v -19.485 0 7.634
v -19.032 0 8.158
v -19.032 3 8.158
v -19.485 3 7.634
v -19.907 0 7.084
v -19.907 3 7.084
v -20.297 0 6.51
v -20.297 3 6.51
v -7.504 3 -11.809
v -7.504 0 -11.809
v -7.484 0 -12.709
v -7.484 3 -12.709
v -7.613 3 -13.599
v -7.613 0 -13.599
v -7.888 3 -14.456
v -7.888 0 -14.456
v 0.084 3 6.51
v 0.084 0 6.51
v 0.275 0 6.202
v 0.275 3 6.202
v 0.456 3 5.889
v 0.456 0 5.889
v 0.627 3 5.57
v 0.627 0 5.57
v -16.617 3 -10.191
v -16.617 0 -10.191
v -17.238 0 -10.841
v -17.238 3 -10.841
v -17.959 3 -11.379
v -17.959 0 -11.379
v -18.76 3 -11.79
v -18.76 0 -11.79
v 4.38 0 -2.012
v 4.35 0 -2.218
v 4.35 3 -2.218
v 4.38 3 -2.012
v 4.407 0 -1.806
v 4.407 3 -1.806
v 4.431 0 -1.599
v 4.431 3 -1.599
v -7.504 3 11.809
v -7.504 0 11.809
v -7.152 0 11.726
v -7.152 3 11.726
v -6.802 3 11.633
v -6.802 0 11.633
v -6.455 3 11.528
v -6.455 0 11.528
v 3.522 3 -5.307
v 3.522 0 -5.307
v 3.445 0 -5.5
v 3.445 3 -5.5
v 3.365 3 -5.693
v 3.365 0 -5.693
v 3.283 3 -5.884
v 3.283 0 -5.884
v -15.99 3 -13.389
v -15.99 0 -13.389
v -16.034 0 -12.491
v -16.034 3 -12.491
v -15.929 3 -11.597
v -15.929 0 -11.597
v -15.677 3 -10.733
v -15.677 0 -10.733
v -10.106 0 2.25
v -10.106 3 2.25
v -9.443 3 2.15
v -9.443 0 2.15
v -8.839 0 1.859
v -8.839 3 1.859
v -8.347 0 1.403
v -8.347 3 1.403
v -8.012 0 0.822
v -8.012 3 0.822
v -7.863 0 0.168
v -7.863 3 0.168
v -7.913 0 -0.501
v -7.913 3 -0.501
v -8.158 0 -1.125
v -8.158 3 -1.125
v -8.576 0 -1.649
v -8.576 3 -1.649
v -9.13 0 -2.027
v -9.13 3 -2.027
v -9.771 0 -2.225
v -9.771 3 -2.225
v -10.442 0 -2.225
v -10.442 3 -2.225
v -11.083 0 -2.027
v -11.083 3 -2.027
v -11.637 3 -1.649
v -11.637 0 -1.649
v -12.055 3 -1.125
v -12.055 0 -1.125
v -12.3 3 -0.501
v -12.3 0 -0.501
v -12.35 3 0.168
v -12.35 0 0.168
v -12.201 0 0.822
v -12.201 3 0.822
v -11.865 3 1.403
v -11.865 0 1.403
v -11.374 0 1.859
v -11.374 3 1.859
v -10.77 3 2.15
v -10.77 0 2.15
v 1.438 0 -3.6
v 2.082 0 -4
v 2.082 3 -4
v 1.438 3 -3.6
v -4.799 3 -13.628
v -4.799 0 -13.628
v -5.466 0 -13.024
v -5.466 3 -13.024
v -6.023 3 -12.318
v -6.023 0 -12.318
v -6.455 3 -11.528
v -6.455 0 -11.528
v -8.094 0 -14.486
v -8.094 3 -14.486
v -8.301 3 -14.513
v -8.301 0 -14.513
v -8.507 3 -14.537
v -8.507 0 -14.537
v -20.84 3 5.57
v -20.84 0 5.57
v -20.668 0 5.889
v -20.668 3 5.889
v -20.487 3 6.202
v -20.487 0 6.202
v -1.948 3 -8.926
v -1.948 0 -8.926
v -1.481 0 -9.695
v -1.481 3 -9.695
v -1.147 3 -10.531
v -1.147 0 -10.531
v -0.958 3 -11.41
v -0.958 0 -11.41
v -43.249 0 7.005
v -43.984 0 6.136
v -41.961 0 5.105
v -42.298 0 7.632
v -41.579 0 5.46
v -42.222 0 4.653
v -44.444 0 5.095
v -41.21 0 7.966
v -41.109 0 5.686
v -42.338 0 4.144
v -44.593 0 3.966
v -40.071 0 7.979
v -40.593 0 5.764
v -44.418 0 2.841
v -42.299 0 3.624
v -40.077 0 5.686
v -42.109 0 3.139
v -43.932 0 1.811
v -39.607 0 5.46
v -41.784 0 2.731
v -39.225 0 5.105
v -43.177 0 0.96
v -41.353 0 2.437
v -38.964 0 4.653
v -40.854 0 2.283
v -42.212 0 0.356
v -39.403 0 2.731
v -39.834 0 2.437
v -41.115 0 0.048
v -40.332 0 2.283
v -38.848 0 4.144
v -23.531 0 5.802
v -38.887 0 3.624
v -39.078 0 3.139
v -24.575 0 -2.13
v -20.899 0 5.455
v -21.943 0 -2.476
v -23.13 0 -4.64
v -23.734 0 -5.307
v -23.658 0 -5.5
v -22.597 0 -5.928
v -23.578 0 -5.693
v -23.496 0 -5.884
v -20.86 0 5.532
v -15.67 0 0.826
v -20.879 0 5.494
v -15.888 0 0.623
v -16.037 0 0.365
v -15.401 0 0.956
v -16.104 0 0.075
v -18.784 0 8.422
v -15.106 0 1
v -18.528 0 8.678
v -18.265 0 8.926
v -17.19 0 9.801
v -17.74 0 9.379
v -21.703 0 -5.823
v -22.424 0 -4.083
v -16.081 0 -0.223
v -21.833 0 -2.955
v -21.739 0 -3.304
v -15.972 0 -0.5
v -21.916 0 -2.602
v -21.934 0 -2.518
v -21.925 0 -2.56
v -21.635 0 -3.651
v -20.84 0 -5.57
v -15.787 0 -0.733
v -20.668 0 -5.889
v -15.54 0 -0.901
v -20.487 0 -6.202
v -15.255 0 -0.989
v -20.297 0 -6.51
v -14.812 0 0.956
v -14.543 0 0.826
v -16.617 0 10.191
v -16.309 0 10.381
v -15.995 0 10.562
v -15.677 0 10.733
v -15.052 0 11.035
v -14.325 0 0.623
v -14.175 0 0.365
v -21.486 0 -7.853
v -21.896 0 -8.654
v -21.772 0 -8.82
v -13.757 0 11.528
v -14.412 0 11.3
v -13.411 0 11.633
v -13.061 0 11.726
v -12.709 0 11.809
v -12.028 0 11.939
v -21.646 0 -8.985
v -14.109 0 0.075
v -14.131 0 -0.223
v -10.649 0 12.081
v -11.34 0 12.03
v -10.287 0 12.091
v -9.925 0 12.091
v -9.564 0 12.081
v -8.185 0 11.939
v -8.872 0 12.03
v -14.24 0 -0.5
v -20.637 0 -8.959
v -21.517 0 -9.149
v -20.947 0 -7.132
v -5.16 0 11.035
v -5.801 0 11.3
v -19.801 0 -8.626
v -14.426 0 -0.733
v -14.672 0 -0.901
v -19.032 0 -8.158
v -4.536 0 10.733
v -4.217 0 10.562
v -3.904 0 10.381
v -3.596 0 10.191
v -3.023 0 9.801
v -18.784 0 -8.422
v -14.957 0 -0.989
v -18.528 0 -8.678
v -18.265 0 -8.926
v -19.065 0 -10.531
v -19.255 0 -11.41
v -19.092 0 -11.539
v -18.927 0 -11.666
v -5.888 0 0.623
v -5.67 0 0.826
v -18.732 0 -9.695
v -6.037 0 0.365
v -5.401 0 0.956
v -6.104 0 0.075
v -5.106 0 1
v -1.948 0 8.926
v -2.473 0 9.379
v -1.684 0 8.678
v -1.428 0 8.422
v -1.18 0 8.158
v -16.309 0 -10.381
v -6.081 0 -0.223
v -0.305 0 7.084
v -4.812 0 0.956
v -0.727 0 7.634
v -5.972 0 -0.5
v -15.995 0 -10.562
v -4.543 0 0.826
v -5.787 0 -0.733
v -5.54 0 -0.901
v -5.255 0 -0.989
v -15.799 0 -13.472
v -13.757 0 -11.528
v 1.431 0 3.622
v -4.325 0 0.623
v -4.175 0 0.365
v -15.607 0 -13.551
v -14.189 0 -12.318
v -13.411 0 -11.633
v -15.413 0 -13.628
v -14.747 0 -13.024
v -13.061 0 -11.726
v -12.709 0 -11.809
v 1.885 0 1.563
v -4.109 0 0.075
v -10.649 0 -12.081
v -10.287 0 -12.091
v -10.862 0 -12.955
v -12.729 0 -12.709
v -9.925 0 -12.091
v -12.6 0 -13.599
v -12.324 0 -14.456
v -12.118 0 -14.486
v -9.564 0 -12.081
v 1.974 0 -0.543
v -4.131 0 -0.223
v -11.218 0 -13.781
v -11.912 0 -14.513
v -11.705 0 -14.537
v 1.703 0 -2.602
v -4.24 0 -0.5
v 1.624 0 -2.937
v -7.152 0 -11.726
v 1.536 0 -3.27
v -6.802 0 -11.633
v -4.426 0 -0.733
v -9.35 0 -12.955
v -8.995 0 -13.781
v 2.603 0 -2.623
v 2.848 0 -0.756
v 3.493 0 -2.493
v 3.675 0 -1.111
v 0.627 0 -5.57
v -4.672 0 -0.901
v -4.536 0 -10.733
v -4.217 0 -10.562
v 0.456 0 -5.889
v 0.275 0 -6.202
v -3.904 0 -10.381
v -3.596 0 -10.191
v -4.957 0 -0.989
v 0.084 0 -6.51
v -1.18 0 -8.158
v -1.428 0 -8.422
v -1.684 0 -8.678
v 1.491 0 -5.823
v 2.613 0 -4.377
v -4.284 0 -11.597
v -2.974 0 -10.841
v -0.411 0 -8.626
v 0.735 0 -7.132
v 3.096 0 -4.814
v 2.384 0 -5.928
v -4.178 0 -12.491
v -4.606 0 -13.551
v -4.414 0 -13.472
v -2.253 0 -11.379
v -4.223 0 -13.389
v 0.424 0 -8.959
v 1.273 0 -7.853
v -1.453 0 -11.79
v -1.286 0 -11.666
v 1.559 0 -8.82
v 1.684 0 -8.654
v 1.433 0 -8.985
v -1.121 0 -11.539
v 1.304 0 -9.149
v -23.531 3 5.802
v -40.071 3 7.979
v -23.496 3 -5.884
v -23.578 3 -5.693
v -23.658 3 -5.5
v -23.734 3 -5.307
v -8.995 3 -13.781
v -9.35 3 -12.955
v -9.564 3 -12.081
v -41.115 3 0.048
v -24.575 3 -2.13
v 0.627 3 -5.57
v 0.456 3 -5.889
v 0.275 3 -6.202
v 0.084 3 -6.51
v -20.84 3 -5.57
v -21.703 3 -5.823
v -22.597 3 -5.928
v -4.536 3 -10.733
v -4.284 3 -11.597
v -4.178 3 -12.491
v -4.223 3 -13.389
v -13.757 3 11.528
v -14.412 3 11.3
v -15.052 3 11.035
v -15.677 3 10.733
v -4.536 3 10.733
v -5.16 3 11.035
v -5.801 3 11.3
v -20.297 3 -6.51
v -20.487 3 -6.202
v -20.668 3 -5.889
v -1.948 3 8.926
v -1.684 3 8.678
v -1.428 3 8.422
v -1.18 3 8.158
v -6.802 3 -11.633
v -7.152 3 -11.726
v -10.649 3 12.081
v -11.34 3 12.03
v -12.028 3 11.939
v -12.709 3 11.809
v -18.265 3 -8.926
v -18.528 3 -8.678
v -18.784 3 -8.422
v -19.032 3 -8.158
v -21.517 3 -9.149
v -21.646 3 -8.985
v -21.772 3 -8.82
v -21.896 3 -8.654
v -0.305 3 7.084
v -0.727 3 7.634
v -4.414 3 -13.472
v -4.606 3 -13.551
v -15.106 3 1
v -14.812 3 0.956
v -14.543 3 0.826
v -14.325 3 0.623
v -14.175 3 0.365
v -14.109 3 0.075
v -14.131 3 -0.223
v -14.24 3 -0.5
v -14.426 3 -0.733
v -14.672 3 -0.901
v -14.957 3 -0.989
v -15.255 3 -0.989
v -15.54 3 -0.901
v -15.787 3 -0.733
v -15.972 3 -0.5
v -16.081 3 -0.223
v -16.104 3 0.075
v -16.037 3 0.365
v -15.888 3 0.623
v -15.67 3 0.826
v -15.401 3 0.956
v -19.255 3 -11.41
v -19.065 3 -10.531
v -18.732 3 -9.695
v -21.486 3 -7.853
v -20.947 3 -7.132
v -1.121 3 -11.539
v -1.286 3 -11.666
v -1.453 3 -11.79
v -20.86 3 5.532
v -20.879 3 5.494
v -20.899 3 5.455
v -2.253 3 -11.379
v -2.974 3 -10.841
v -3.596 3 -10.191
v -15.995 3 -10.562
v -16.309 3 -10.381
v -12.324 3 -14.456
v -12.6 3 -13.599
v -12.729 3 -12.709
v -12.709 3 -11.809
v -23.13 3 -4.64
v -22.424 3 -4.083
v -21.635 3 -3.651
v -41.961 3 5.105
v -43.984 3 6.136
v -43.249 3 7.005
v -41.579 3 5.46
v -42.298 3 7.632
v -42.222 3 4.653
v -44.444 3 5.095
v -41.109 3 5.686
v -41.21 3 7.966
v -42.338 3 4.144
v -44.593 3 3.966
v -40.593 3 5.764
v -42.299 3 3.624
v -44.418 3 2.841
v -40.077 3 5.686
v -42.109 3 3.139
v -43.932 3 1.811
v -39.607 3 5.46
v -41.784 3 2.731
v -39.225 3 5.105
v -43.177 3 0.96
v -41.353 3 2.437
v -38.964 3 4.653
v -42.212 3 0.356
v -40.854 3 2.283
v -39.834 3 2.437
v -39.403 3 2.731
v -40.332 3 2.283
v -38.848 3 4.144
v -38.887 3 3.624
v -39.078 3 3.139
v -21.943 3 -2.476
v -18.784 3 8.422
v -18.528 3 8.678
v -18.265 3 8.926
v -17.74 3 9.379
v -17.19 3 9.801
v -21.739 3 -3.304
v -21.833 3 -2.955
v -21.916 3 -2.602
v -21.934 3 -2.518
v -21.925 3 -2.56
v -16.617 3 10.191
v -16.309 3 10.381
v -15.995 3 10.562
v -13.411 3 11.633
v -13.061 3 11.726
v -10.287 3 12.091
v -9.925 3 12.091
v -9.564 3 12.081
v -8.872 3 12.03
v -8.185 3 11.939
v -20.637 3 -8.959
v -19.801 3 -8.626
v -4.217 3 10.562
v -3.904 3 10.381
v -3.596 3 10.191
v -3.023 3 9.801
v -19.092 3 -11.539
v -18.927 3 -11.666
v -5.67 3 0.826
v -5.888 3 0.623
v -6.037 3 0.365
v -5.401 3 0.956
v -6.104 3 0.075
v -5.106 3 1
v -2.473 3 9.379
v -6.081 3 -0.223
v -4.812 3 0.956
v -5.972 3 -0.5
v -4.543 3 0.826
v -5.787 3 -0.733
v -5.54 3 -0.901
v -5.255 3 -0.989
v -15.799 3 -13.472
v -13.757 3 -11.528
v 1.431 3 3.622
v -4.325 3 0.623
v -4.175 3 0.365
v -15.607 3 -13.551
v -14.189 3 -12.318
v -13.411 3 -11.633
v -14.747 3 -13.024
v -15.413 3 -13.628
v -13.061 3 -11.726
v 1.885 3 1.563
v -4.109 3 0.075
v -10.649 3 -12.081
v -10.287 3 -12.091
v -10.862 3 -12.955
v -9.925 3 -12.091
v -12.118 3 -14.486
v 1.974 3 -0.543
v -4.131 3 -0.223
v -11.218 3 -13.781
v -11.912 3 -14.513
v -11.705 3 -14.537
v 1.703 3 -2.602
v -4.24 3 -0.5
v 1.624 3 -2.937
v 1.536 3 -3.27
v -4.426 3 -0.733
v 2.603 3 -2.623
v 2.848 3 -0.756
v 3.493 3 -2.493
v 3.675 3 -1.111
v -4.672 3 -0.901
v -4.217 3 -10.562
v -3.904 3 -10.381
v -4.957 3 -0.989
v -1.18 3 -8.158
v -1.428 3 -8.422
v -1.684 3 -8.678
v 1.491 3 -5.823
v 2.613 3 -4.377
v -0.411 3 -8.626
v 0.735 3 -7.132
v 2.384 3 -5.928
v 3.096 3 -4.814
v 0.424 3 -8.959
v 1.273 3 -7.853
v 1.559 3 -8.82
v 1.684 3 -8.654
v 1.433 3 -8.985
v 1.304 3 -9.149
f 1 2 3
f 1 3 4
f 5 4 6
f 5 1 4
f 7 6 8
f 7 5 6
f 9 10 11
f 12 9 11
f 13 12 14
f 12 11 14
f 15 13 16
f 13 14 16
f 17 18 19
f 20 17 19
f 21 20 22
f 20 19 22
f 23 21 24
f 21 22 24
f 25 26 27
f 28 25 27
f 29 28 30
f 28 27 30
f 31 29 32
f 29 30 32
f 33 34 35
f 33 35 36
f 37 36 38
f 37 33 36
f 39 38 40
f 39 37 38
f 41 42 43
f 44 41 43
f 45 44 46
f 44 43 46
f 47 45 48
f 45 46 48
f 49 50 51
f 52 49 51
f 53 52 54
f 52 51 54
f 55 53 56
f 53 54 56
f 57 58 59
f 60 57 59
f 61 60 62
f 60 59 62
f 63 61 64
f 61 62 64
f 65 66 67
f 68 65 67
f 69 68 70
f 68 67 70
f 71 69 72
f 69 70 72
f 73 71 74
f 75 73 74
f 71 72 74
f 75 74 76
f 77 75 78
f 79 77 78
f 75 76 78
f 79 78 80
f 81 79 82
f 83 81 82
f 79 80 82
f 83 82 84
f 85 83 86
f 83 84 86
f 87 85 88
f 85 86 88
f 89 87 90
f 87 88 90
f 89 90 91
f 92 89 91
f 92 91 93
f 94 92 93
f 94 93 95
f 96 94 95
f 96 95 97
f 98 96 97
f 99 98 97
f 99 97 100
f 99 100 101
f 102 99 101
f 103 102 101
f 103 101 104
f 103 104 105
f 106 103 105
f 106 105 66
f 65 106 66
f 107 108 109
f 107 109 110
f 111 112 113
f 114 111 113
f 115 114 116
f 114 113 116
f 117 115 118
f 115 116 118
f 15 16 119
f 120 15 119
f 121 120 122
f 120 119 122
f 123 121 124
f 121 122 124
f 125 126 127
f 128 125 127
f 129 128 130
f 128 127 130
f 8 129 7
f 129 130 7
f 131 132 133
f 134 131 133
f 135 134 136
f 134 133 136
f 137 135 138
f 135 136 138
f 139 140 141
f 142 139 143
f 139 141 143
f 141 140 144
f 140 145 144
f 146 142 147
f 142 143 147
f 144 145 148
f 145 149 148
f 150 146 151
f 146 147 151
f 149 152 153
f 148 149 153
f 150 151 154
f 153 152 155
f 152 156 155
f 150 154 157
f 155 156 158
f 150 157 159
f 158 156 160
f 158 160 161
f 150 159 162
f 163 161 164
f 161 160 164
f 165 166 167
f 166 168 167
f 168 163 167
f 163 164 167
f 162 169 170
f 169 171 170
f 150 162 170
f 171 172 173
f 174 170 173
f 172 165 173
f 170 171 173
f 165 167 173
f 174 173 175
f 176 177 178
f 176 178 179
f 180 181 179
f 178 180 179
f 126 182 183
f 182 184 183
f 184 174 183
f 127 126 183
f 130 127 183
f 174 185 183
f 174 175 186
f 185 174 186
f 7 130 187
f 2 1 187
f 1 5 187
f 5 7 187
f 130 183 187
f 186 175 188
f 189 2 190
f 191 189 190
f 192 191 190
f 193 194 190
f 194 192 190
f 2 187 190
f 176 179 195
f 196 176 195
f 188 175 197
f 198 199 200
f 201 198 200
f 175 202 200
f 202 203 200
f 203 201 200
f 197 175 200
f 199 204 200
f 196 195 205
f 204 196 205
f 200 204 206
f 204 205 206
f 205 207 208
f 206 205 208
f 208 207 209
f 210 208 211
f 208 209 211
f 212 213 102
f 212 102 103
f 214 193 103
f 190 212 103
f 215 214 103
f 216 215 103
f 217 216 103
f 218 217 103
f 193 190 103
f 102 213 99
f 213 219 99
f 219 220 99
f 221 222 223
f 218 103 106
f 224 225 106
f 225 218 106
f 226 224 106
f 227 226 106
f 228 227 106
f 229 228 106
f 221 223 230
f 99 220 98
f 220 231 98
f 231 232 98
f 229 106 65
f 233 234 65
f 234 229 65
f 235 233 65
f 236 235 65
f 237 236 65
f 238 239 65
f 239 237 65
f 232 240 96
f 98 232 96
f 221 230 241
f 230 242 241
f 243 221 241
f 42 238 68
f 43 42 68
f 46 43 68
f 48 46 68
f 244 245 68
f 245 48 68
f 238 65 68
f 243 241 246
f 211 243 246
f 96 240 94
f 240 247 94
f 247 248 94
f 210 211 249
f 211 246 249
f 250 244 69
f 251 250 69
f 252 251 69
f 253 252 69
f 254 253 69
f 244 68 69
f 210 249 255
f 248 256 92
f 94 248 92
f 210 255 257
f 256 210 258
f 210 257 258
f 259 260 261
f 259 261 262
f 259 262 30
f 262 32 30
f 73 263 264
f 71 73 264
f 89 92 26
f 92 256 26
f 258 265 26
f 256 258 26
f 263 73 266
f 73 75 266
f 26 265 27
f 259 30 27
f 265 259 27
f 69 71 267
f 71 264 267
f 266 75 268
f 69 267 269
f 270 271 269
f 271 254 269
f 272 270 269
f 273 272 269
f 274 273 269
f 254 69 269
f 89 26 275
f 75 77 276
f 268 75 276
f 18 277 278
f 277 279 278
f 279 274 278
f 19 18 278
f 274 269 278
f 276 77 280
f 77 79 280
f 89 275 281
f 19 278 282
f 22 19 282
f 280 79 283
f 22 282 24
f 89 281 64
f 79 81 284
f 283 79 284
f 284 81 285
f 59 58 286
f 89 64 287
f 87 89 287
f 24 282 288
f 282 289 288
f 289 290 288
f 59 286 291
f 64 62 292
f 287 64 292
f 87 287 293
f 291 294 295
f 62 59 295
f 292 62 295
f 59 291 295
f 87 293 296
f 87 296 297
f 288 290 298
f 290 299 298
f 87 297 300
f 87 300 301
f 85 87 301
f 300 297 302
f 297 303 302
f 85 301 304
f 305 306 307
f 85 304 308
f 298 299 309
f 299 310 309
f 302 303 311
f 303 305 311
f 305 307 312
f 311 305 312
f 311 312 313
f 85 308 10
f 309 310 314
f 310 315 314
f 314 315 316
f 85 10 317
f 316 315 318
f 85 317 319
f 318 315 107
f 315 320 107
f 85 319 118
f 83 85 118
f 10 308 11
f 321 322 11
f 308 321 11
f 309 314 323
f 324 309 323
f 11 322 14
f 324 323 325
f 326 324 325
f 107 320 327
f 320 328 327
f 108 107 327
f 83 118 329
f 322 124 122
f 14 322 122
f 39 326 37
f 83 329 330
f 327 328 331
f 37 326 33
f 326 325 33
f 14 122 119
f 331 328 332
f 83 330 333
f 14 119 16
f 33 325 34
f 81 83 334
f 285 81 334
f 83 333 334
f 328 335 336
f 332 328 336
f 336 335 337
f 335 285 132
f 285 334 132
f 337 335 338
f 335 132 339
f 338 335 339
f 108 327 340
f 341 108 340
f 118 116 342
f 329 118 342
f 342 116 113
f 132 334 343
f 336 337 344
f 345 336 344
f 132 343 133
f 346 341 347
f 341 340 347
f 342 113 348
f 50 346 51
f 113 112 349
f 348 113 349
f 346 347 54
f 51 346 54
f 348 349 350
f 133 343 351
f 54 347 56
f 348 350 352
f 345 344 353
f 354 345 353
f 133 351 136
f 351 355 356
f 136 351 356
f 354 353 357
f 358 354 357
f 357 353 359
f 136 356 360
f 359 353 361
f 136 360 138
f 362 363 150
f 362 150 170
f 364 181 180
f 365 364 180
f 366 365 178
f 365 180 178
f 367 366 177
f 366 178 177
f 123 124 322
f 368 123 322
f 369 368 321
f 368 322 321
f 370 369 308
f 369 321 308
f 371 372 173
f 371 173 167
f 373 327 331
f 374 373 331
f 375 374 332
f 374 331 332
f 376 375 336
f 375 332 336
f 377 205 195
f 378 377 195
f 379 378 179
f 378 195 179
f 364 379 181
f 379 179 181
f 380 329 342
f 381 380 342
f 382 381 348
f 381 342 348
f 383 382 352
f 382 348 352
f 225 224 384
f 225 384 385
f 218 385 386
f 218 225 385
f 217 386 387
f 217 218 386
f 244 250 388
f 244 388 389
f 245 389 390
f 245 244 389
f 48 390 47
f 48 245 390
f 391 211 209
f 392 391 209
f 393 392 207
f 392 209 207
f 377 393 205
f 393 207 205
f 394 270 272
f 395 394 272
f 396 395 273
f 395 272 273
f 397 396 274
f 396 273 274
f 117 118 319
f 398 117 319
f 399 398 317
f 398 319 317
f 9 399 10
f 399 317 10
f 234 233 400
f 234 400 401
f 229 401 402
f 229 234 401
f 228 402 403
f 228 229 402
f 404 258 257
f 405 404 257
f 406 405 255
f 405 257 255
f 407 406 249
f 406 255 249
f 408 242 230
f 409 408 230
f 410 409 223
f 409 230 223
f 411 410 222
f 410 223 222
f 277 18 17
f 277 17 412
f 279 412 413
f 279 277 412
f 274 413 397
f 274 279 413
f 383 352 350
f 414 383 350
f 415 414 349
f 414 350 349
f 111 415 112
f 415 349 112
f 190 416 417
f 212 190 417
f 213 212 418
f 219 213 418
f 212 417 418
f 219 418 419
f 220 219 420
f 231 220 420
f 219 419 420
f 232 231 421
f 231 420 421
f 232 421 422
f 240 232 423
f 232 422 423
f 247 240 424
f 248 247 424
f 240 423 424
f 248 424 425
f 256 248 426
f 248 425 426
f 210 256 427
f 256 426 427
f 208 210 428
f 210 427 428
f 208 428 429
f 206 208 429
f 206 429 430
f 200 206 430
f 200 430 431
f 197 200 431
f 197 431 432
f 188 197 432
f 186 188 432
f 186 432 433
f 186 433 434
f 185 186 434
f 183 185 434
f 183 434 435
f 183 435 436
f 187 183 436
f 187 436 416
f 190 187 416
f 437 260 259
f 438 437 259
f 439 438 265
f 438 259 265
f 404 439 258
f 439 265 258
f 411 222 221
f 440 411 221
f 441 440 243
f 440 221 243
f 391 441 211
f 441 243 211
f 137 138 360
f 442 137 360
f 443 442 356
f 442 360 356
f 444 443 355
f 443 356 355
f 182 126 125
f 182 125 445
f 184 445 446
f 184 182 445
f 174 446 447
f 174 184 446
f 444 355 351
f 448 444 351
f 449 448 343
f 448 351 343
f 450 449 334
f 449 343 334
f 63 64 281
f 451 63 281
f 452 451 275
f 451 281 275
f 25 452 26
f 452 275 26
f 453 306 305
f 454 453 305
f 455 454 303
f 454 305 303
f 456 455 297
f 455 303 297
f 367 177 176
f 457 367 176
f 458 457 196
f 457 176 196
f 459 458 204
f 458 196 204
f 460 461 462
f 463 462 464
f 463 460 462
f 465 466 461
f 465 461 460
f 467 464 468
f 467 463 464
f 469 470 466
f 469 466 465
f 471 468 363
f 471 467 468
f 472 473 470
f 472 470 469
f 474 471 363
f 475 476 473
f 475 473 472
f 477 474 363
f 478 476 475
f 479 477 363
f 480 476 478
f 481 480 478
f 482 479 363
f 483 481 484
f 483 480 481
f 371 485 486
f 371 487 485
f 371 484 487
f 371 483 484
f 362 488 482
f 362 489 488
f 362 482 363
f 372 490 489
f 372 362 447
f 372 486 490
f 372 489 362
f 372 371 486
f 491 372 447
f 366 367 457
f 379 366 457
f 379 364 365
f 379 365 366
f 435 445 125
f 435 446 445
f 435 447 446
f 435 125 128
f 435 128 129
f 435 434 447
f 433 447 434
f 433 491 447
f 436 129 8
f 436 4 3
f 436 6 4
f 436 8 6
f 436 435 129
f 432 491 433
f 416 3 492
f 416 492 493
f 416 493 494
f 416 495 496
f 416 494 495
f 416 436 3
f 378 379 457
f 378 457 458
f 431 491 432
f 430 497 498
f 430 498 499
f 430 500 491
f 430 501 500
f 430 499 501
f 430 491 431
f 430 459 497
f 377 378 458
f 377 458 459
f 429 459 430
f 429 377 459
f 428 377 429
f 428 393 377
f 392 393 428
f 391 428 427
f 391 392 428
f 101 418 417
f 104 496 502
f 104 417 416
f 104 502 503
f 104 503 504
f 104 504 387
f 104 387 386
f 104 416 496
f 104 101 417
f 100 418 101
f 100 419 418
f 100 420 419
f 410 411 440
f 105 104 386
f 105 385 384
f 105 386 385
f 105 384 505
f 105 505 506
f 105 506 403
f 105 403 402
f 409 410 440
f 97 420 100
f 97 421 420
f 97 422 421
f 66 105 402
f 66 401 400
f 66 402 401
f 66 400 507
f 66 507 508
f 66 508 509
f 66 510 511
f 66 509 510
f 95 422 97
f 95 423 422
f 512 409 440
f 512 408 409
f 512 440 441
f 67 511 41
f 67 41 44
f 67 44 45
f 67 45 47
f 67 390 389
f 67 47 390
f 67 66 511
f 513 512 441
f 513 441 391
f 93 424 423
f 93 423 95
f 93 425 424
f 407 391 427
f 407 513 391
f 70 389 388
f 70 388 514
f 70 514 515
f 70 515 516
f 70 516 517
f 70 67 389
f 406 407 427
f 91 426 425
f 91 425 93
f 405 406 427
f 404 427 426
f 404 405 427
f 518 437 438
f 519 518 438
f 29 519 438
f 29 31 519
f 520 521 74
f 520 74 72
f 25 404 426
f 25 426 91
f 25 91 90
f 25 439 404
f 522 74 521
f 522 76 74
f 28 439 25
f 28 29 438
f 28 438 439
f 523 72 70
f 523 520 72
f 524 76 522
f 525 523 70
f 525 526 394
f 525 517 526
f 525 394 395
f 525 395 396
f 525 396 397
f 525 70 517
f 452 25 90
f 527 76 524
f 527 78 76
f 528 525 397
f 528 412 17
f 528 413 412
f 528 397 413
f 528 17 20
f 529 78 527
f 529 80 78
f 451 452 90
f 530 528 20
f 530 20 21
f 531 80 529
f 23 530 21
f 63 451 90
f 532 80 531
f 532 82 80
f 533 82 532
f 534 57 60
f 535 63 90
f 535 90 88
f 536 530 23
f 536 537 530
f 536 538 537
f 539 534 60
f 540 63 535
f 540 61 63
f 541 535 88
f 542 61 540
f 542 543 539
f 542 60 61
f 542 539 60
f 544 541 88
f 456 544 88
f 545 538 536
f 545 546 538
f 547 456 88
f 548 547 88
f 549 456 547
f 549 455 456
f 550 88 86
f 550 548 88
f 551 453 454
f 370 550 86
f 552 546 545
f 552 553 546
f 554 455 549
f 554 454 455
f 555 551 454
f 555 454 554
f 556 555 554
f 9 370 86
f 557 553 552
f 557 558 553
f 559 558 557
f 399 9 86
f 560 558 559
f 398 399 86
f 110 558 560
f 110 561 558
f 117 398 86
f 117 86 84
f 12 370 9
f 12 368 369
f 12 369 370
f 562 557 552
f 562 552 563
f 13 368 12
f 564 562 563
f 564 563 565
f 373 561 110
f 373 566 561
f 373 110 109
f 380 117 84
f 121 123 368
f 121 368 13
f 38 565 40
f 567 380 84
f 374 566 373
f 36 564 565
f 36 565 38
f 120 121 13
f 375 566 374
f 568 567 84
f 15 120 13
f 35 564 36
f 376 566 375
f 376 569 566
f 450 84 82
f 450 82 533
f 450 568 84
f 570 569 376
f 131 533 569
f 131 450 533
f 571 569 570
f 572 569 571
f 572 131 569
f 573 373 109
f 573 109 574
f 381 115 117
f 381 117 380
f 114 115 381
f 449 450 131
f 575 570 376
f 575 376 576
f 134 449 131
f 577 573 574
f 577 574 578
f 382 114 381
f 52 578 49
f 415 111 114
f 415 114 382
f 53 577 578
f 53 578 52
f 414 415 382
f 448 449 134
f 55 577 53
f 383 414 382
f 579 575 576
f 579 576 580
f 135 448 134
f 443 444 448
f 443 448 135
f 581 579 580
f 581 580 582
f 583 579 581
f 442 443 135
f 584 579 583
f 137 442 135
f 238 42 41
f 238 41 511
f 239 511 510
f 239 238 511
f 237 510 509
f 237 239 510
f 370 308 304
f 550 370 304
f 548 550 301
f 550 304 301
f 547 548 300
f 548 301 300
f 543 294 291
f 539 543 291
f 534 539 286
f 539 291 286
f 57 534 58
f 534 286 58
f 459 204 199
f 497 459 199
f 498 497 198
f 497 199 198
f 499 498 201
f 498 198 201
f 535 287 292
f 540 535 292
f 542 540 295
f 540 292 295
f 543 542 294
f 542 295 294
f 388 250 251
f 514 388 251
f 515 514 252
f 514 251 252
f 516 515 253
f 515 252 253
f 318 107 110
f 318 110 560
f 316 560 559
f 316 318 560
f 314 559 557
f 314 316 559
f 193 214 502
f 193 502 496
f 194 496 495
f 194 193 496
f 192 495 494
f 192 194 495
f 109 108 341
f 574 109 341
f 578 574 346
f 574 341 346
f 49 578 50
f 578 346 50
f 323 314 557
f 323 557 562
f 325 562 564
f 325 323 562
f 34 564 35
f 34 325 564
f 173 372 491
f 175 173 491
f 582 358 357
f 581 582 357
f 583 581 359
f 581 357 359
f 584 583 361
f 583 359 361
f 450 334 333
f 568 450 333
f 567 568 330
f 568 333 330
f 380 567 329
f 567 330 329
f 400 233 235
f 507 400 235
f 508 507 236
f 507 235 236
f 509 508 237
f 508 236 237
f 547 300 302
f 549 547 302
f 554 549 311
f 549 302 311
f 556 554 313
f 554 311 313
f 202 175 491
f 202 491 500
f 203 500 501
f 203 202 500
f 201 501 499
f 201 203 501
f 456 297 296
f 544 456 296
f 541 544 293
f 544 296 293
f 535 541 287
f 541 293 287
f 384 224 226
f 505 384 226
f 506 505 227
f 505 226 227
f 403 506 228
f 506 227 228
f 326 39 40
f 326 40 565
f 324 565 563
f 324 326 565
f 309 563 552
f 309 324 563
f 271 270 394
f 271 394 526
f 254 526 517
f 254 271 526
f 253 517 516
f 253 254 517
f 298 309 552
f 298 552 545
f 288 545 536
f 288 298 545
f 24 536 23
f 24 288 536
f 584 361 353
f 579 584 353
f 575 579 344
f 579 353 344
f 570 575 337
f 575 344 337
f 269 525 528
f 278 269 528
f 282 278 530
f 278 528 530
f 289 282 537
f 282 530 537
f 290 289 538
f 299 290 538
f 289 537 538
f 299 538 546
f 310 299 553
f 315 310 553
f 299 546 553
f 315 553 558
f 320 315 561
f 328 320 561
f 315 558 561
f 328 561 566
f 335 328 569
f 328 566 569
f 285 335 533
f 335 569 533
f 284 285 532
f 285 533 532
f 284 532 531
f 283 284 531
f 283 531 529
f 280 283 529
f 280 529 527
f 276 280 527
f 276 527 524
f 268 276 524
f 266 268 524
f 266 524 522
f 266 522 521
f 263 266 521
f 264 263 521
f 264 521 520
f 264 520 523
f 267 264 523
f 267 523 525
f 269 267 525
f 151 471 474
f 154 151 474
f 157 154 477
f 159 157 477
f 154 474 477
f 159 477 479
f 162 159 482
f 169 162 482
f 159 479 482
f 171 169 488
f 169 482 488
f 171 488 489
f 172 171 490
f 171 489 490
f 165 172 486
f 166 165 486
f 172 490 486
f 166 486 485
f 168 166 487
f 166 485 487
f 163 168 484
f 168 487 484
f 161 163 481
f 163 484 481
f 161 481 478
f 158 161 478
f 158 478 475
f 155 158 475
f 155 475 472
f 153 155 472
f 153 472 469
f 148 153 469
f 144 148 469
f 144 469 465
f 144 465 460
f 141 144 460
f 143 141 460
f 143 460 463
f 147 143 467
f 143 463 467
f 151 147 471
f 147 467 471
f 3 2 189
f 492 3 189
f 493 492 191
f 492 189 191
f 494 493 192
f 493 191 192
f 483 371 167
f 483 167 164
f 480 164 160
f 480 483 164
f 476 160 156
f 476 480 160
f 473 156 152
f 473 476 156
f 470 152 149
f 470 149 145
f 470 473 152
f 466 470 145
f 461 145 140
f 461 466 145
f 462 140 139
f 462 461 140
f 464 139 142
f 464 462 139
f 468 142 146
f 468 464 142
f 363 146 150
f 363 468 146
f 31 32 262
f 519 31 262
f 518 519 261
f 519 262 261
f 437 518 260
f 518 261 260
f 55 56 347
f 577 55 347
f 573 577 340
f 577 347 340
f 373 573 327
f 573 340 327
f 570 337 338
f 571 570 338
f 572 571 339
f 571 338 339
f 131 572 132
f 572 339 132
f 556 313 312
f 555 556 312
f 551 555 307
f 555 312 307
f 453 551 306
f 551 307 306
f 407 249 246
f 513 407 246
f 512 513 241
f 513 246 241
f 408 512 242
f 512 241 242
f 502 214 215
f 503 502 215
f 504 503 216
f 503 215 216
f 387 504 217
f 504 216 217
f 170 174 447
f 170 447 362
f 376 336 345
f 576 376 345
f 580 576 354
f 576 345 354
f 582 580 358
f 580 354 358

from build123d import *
from build123d.topology import SkipClean

# Parameters (mm, degrees)
SKETCH1_R           = 1.5
BOSS_EXTRUDE1_DEPTH = 3
SKETCH3_R           = 1.75
BOSS_EXTRUDE2_DEPTH = 3
CUT_EXTRUDE1_START  = -4
CUT_EXTRUDE1_DEPTH  = 4
CUT_EXTRUDE2_REACH  = 48.999
SKETCH5_R           = 1
SKETCH5_R_2         = 2.25


with BuildPart() as part:
    # Sketch1 → Boss-Extrude1 (new body)
    with BuildSketch(Plane(origin=(0, 0, 0), x_dir=(1, 0, 0), z_dir=(0, 1, 0))):
        with BuildLine():
            Line((20.643657446, 4), (2.081641936, 4))
            ThreePointArc((2.081641936, 4), (2.861028333, 4.588201733), (3.521749436, 5.30713988))
            ThreePointArc((3.521749436, 5.30713988), (3.405395609, 5.596745198), (3.282888305, 5.883801663))
            ThreePointArc((3.282888305, 5.883801663), (1.93527598, 5.894040025), (0.627094961, 5.57027124))
            ThreePointArc((0.627094961, 5.57027124), (0.366286148, 6.046375), (0.084372603, 6.510293938))
            ThreePointArc((0.084372603, 6.510293938), (1.018855105, 7.48132754), (1.683794586, 8.65351323))
            ThreePointArc((1.683794586, 8.65351323), (1.496450048, 8.903135899), (1.303821399, 9.148703928))
            ThreePointArc((1.303821399, 9.148703928), (-0.000522033, 8.809805691), (-1.180330337, 8.158486898))
            ThreePointArc((-1.180330337, 8.158486898), (-1.555477026, 8.550865528), (-1.947855656, 8.926012217))
            ThreePointArc((-1.947855656, 8.926012217), (-1.296536862, 10.105820521), (-0.957638625, 11.410163953))
            ThreePointArc((-0.957638625, 11.410163953), (-1.203206655, 11.602792602), (-1.452829324, 11.79013714))
            ThreePointArc((-1.452829324, 11.79013714), (-2.625015014, 11.125197659), (-3.596048616, 10.190715157))
            ThreePointArc((-3.596048616, 10.190715157), (-4.059967554, 10.472628702), (-4.536071314, 10.733437515))
            ThreePointArc((-4.536071314, 10.733437515), (-4.212302529, 12.041618533), (-4.222540891, 13.389230859))
            ThreePointArc((-4.222540891, 13.389230859), (-4.509597355, 13.511738163), (-4.799202674, 13.62809199))
            ThreePointArc((-4.799202674, 13.62809199), (-5.759348103, 12.682425791), (-6.455432668, 11.528463019))
            ThreePointArc((-6.455432668, 11.528463019), (-6.976508546, 11.680699536), (-7.503891752, 11.809396783))
            ThreePointArc((-7.503891752, 11.809396783), (-7.529737283, 13.156800143), (-7.888414517, 14.455843809))
            ThreePointArc((-7.888414517, 14.455843809), (-8.197396993, 14.499881098), (-8.507248835, 14.537314892))
            ThreePointArc((-8.507248835, 14.537314892), (-9.18992168, 13.375367565), (-9.563620196, 12.080565177))
            ThreePointArc((-9.563620196, 12.080565177), (-10.106342554, 12.09275), (-10.649064912, 12.080565177))
            ThreePointArc((-10.649064912, 12.080565177), (-11.022763428, 13.375367565), (-11.705436272, 14.537314892))
            ThreePointArc((-11.705436272, 14.537314892), (-12.015288115, 14.499881098), (-12.324270591, 14.455843809))
            ThreePointArc((-12.324270591, 14.455843809), (-12.682947825, 13.156800143), (-12.708793355, 11.809396783))
            ThreePointArc((-12.708793355, 11.809396783), (-13.236176561, 11.680699536), (-13.757252439, 11.528463019))
            ThreePointArc((-13.757252439, 11.528463019), (-14.453337005, 12.682425791), (-15.413482434, 13.62809199))
            ThreePointArc((-15.413482434, 13.62809199), (-15.703087752, 13.511738163), (-15.990144217, 13.389230859))
            ThreePointArc((-15.990144217, 13.389230859), (-16.000382579, 12.041618533), (-15.676613793, 10.733437515))
            ThreePointArc((-15.676613793, 10.733437515), (-16.152717554, 10.472628702), (-16.616636492, 10.190715157))
            ThreePointArc((-16.616636492, 10.190715157), (-17.587670094, 11.125197659), (-18.759855783, 11.79013714))
            ThreePointArc((-18.759855783, 11.79013714), (-19.009478453, 11.602792602), (-19.255046482, 11.410163953))
            ThreePointArc((-19.255046482, 11.410163953), (-18.916148245, 10.105820521), (-18.264829452, 8.926012217))
            ThreePointArc((-18.264829452, 8.926012217), (-18.657208082, 8.550865528), (-19.032354771, 8.158486898))
            ThreePointArc((-19.032354771, 8.158486898), (-20.212163074, 8.809805691), (-21.516506507, 9.148703928))
            ThreePointArc((-21.516506507, 9.148703928), (-21.709135156, 8.903135899), (-21.896479694, 8.65351323))
            ThreePointArc((-21.896479694, 8.65351323), (-21.231540213, 7.48132754), (-20.297057711, 6.510293938))
            ThreePointArc((-20.297057711, 6.510293938), (-20.578971255, 6.046375), (-20.839780068, 5.57027124))
            ThreePointArc((-20.839780068, 5.57027124), (-22.147961087, 5.894040025), (-23.495573413, 5.883801663))
            ThreePointArc((-23.495573413, 5.883801663), (-23.618080717, 5.596745198), (-23.734434544, 5.30713988))
            ThreePointArc((-23.734434544, 5.30713988), (-22.788768345, 4.346994451), (-21.634805572, 3.650909885))
            ThreePointArc((-21.634805572, 3.650909885), (-21.78704209, 3.129834008), (-21.915739337, 2.602450802))
            ThreePointArc((-21.915739337, 2.602450802), (-23.263142697, 2.576605271), (-24.562186363, 2.217928037))
            ThreePointArc((-24.562186363, 2.217928037), (-24.606223651, 1.908945561), (-24.643657446, 1.599093719))
            ThreePointArc((-24.643657446, 1.599093719), (-23.481710119, 0.916420874), (-22.186907731, 0.542722358))
            ThreePointArc((-22.186907731, 0.542722358), (-22.199092554, 0), (-22.186907731, -0.542722358))
            ThreePointArc((-22.186907731, -0.542722358), (-23.481710119, -0.916420874), (-24.643657446, -1.599093719))
            ThreePointArc((-24.643657446, -1.599093719), (-24.606223651, -1.908945561), (-24.562186363, -2.217928037))
            ThreePointArc((-24.562186363, -2.217928037), (-23.263142697, -2.576605271), (-21.915739337, -2.602450802))
            ThreePointArc((-21.915739337, -2.602450802), (-21.78704209, -3.129834008), (-21.634805572, -3.650909885))
            ThreePointArc((-21.634805572, -3.650909885), (-22.788768345, -4.346994451), (-23.734434544, -5.30713988))
            ThreePointArc((-23.734434544, -5.30713988), (-23.618080717, -5.596745198), (-23.495573413, -5.883801663))
            ThreePointArc((-23.495573413, -5.883801663), (-22.147961087, -5.894040025), (-20.839780068, -5.57027124))
            ThreePointArc((-20.839780068, -5.57027124), (-20.578971255, -6.046375), (-20.297057711, -6.510293938))
            ThreePointArc((-20.297057711, -6.510293938), (-21.231540213, -7.48132754), (-21.896479694, -8.65351323))
            ThreePointArc((-21.896479694, -8.65351323), (-21.709135156, -8.903135899), (-21.516506507, -9.148703928))
            ThreePointArc((-21.516506507, -9.148703928), (-20.212163074, -8.809805691), (-19.032354771, -8.158486898))
            ThreePointArc((-19.032354771, -8.158486898), (-18.657208082, -8.550865528), (-18.264829452, -8.926012217))
            ThreePointArc((-18.264829452, -8.926012217), (-18.916148245, -10.105820521), (-19.255046482, -11.410163953))
            ThreePointArc((-19.255046482, -11.410163953), (-19.009478453, -11.602792602), (-18.759855783, -11.79013714))
            ThreePointArc((-18.759855783, -11.79013714), (-17.587670094, -11.125197659), (-16.616636492, -10.190715157))
            ThreePointArc((-16.616636492, -10.190715157), (-16.152717554, -10.472628702), (-15.676613793, -10.733437515))
            ThreePointArc((-15.676613793, -10.733437515), (-16.000382579, -12.041618533), (-15.990144217, -13.389230859))
            ThreePointArc((-15.990144217, -13.389230859), (-15.703087752, -13.511738163), (-15.413482434, -13.62809199))
            ThreePointArc((-15.413482434, -13.62809199), (-14.453337005, -12.682425791), (-13.757252439, -11.528463019))
            ThreePointArc((-13.757252439, -11.528463019), (-13.236176561, -11.680699536), (-12.708793355, -11.809396783))
            ThreePointArc((-12.708793355, -11.809396783), (-12.682947825, -13.156800143), (-12.324270591, -14.455843809))
            ThreePointArc((-12.324270591, -14.455843809), (-12.015288115, -14.499881098), (-11.705436272, -14.537314892))
            ThreePointArc((-11.705436272, -14.537314892), (-11.022763428, -13.375367565), (-10.649064912, -12.080565177))
            ThreePointArc((-10.649064912, -12.080565177), (-10.106342554, -12.09275), (-9.563620196, -12.080565177))
            ThreePointArc((-9.563620196, -12.080565177), (-9.18992168, -13.375367565), (-8.507248835, -14.537314892))
            ThreePointArc((-8.507248835, -14.537314892), (-8.197396993, -14.499881098), (-7.888414517, -14.455843809))
            ThreePointArc((-7.888414517, -14.455843809), (-7.529737283, -13.156800143), (-7.503891752, -11.809396783))
            ThreePointArc((-7.503891752, -11.809396783), (-6.976508546, -11.680699536), (-6.455432668, -11.528463019))
            ThreePointArc((-6.455432668, -11.528463019), (-5.759348103, -12.682425791), (-4.799202674, -13.62809199))
            ThreePointArc((-4.799202674, -13.62809199), (-4.509597355, -13.511738163), (-4.222540891, -13.389230859))
            ThreePointArc((-4.222540891, -13.389230859), (-4.212302529, -12.041618533), (-4.536071314, -10.733437515))
            ThreePointArc((-4.536071314, -10.733437515), (-4.059967554, -10.472628702), (-3.596048616, -10.190715157))
            ThreePointArc((-3.596048616, -10.190715157), (-2.625015014, -11.125197659), (-1.452829324, -11.79013714))
            ThreePointArc((-1.452829324, -11.79013714), (-1.203206655, -11.602792602), (-0.957638625, -11.410163953))
            ThreePointArc((-0.957638625, -11.410163953), (-1.296536862, -10.105820521), (-1.947855656, -8.926012217))
            ThreePointArc((-1.947855656, -8.926012217), (-1.555477026, -8.550865528), (-1.180330337, -8.158486898))
            ThreePointArc((-1.180330337, -8.158486898), (-0.000522033, -8.809805691), (1.303821399, -9.148703928))
            ThreePointArc((1.303821399, -9.148703928), (1.496450048, -8.903135899), (1.683794586, -8.65351323))
            ThreePointArc((1.683794586, -8.65351323), (1.018855105, -7.48132754), (0.084372603, -6.510293938))
            ThreePointArc((0.084372603, -6.510293938), (0.366286148, -6.046375), (0.627094961, -5.57027124))
            ThreePointArc((0.627094961, -5.57027124), (1.93527598, -5.894040025), (3.282888305, -5.883801663))
            ThreePointArc((3.282888305, -5.883801663), (3.405395609, -5.596745198), (3.521749436, -5.30713988))
            ThreePointArc((3.521749436, -5.30713988), (2.861028333, -4.588201733), (2.081641936, -4))
            Line((2.081641936, -4), (20.643657446, -4))
            ThreePointArc((20.643657446, -4), (24.643657446, 0), (20.643657446, 4))
        make_face()
        with Locations(Location((-10.106342554, 0, 0), (0, 0, 270))):
            Circle(SKETCH1_R, mode=Mode.SUBTRACT)
        with Locations(Location((20.643657446, 0, 0), (0, 0, 270))):
            Circle(SKETCH1_R, mode=Mode.SUBTRACT)
    extrude(amount=BOSS_EXTRUDE1_DEPTH)

    # Sketch3 → Boss-Extrude2 (add)
    with BuildSketch(Plane(origin=(0, 3, 0), x_dir=(1, 0, 0), z_dir=(0, 1, 0))):
        with BuildLine():
            ThreePointArc((-9.584237785, -3.965779445), (-14.072121999, -0.522104769), (-10.628447323, 3.965779445))
            Line((-10.628447323, 3.965779445), (-41.11537681, -0.047900965))
            ThreePointArc((-41.11537681, -0.047900965), (-44.559051487, -4.53578518), (-40.071167272, -7.979459856))
            Line((-40.071167272, -7.979459856), (-9.584237785, -3.965779445))
        make_face()
        with Locations(Location((-40.593272041, -4.013680411, 0), (0, 0, 270))):
            Circle(SKETCH3_R, mode=Mode.SUBTRACT)
    extrude(amount=-BOSS_EXTRUDE2_DEPTH)

    # Sketch4 → Cut-Extrude1 (cut)
    with SkipClean():  # the faces are left unmerged after this step: merging them gives an invalid solid
        with BuildSketch(Plane(origin=(0, 3, 0), x_dir=(1, 0, 0), z_dir=(0, 1, 0)).offset(CUT_EXTRUDE1_START)):
            with BuildLine():
                ThreePointArc((20.643657446, -4), (24.643657446, 0), (20.643657446, 4))
                Line((20.643657446, 4), (2.081641936, 4))
                Line((2.081641936, 4), (1.43808022, 3.600125745))
                ThreePointArc((1.43808022, 3.600125745), (1.581217534, 3.104116905), (1.70305423, 2.602450802))
                ThreePointArc((1.70305423, 2.602450802), (3.050457589, 2.576605271), (4.349501255, 2.217928037))
                ThreePointArc((4.349501255, 2.217928037), (4.393538544, 1.908945561), (4.430972339, 1.599093719))
                ThreePointArc((4.430972339, 1.599093719), (3.269025011, 0.916420874), (1.974222624, 0.542722358))
                ThreePointArc((1.974222624, 0.542722358), (1.70305423, -2.602450802), (0.627094961, -5.57027124))
                ThreePointArc((0.627094961, -5.57027124), (1.93527598, -5.894040025), (3.282888305, -5.883801663))
                ThreePointArc((3.282888305, -5.883801663), (3.405395609, -5.596745198), (3.521749436, -5.30713988))
                ThreePointArc((3.521749436, -5.30713988), (2.861028333, -4.588201733), (2.081641936, -4))
                Line((2.081641936, -4), (20.643657446, -4))
            make_face()
            with BuildLine():
                ThreePointArc((1.683794586, -8.65351323), (1.018855105, -7.48132754), (0.084372603, -6.510293938))
                ThreePointArc((0.084372603, -6.510293938), (-0.512518948, -7.361599771), (-1.180330337, -8.158486898))
                ThreePointArc((-1.180330337, -8.158486898), (-0.000522033, -8.809805691), (1.303821399, -9.148703928))
                ThreePointArc((1.303821399, -9.148703928), (1.496450048, -8.903135899), (1.683794586, -8.65351323))
            make_face()
            with BuildLine():
                ThreePointArc((-0.957638625, -11.410163953), (-1.296536862, -10.105820521), (-1.947855656, -8.926012217))
                ThreePointArc((-1.947855656, -8.926012217), (-2.744742783, -9.593823606), (-3.596048616, -10.190715157))
                ThreePointArc((-3.596048616, -10.190715157), (-2.625015014, -11.125197659), (-1.452829324, -11.79013714))
                ThreePointArc((-1.452829324, -11.79013714), (-1.203206655, -11.602792602), (-0.957638625, -11.410163953))
            make_face()
            with BuildLine():
                ThreePointArc((-4.222540891, -13.389230859), (-4.212302529, -12.041618533), (-4.536071314, -10.733437515))
                ThreePointArc((-4.536071314, -10.733437515), (-5.478647477, -11.172244217), (-6.455432668, -11.528463019))
                ThreePointArc((-6.455432668, -11.528463019), (-5.759348103, -12.682425791), (-4.799202674, -13.62809199))
                ThreePointArc((-4.799202674, -13.62809199), (-4.509597355, -13.511738163), (-4.222540891, -13.389230859))
            make_face()
            with BuildLine():
                ThreePointArc((-7.888414517, -14.455843809), (-7.529737283, -13.156800143), (-7.503891752, -11.809396783))
                ThreePointArc((-7.503891752, -11.809396783), (-8.527921943, -11.989294847), (-9.563620196, -12.080565177))
                ThreePointArc((-9.563620196, -12.080565177), (-9.18992168, -13.375367565), (-8.507248835, -14.537314892))
                ThreePointArc((-8.507248835, -14.537314892), (-8.197396993, -14.499881098), (-7.888414517, -14.455843809))
            make_face()
            with BuildLine():
                ThreePointArc((-11.705436272, -14.537314892), (-11.022763428, -13.375367565), (-10.649064912, -12.080565177))
                ThreePointArc((-10.649064912, -12.080565177), (-11.684763165, -11.989294847), (-12.708793355, -11.809396783))
                ThreePointArc((-12.708793355, -11.809396783), (-12.682947825, -13.156800143), (-12.324270591, -14.455843809))
                ThreePointArc((-12.324270591, -14.455843809), (-12.015288115, -14.499881098), (-11.705436272, -14.537314892))
            make_face()
            with BuildLine():
                ThreePointArc((-15.413482434, -13.62809199), (-14.453337005, -12.682425791), (-13.757252439, -11.528463019))
                ThreePointArc((-13.757252439, -11.528463019), (-14.734037631, -11.172244217), (-15.676613793, -10.733437515))
                ThreePointArc((-15.676613793, -10.733437515), (-16.000382579, -12.041618533), (-15.990144217, -13.389230859))
                ThreePointArc((-15.990144217, -13.389230859), (-15.703087752, -13.511738163), (-15.413482434, -13.62809199))
            make_face()
            with BuildLine():
                ThreePointArc((-18.759855783, -11.79013714), (-17.587670094, -11.125197659), (-16.616636492, -10.190715157))
                ThreePointArc((-16.616636492, -10.190715157), (-17.467942324, -9.593823606), (-18.264829452, -8.926012217))
                ThreePointArc((-18.264829452, -8.926012217), (-18.916148245, -10.105820521), (-19.255046482, -11.410163953))
                ThreePointArc((-19.255046482, -11.410163953), (-19.009478453, -11.602792602), (-18.759855783, -11.79013714))
            make_face()
            with BuildLine():
                ThreePointArc((-21.516506507, -9.148703928), (-20.212163074, -8.809805691), (-19.032354771, -8.158486898))
                ThreePointArc((-19.032354771, -8.158486898), (-19.70016616, -7.361599771), (-20.297057711, -6.510293938))
                ThreePointArc((-20.297057711, -6.510293938), (-21.231540213, -7.48132754), (-21.896479694, -8.65351323))
                ThreePointArc((-21.896479694, -8.65351323), (-21.709135156, -8.903135899), (-21.516506507, -9.148703928))
            make_face()
            with BuildLine():
                ThreePointArc((-21.942853375, 2.47620963), (-21.92946485, 2.539366405), (-21.915739337, 2.602450802))
                ThreePointArc((-21.915739337, 2.602450802), (-23.263142697, 2.576605271), (-24.562186363, 2.217928037))
                ThreePointArc((-24.562186363, 2.217928037), (-24.56889027, 2.173784387), (-24.575459377, 2.129620475))
                Line((-24.575459377, 2.129620475), (-21.942853375, 2.47620963))
            make_face()
            with BuildLine():
                ThreePointArc((-23.495573413, -5.883801663), (-22.147961087, -5.894040025), (-20.839780068, -5.57027124))
                ThreePointArc((-20.839780068, -5.57027124), (-20.869365339, -5.512888815), (-20.898643838, -5.455349261))
                Line((-20.898643838, -5.455349261), (-23.531249839, -5.801938416))
                ThreePointArc((-23.531249839, -5.801938416), (-23.513474108, -5.842897269), (-23.495573413, -5.883801663))
            make_face()
        extrude(amount=CUT_EXTRUDE1_DEPTH, mode=Mode.SUBTRACT)

    # Sketch5 → Cut-Extrude2 (cut, up to next)
    with BuildSketch(Plane(origin=(0, 3, 0), x_dir=(1, 0, 0), z_dir=(0, 1, 0)), mode=Mode.PRIVATE) as cut_extrude2_sk1:
        with Locations(Location((-15.106342554, 0, 0), (0, 0, 270))):
            Circle(SKETCH5_R)
    cut_extrude2_tool1 = extrude(cut_extrude2_sk1.sketch, amount=-CUT_EXTRUDE2_REACH, mode=Mode.PRIVATE) & part.part
    # Sketch5 → Cut-Extrude2 (cut, up to next)
    with BuildSketch(Plane(origin=(0, 3, 0), x_dir=(1, 0, 0), z_dir=(0, 1, 0)), mode=Mode.PRIVATE) as cut_extrude2_sk2:
        with Locations(Location((-5.106342554, 0, 0), (0, 0, 270))):
            Circle(SKETCH5_R)
    cut_extrude2_tool2 = extrude(cut_extrude2_sk2.sketch, amount=-CUT_EXTRUDE2_REACH, mode=Mode.PRIVATE) & part.part
    # Sketch5 → Cut-Extrude2 (cut, up to next)
    with BuildSketch(Plane(origin=(0, 3, 0), x_dir=(1, 0, 0), z_dir=(0, 1, 0)), mode=Mode.PRIVATE) as cut_extrude2_sk3:
        with Locations(Location((-10.106342554, 0, 0), (0, 0, 270))):
            Circle(SKETCH5_R_2)
    cut_extrude2_tool3 = extrude(cut_extrude2_sk3.sketch, amount=-CUT_EXTRUDE2_REACH, mode=Mode.PRIVATE) & part.part
    add(cut_extrude2_tool1.solids().sort_by_distance((-15.106343, 3, 0))[0], mode=Mode.SUBTRACT)
    add(cut_extrude2_tool2.solids().sort_by_distance((-5.106343, 3, 0))[0], mode=Mode.SUBTRACT)
    add(cut_extrude2_tool3.solids().sort_by_distance((-10.106343, 3, 0))[0], mode=Mode.SUBTRACT)


solid = part.part
